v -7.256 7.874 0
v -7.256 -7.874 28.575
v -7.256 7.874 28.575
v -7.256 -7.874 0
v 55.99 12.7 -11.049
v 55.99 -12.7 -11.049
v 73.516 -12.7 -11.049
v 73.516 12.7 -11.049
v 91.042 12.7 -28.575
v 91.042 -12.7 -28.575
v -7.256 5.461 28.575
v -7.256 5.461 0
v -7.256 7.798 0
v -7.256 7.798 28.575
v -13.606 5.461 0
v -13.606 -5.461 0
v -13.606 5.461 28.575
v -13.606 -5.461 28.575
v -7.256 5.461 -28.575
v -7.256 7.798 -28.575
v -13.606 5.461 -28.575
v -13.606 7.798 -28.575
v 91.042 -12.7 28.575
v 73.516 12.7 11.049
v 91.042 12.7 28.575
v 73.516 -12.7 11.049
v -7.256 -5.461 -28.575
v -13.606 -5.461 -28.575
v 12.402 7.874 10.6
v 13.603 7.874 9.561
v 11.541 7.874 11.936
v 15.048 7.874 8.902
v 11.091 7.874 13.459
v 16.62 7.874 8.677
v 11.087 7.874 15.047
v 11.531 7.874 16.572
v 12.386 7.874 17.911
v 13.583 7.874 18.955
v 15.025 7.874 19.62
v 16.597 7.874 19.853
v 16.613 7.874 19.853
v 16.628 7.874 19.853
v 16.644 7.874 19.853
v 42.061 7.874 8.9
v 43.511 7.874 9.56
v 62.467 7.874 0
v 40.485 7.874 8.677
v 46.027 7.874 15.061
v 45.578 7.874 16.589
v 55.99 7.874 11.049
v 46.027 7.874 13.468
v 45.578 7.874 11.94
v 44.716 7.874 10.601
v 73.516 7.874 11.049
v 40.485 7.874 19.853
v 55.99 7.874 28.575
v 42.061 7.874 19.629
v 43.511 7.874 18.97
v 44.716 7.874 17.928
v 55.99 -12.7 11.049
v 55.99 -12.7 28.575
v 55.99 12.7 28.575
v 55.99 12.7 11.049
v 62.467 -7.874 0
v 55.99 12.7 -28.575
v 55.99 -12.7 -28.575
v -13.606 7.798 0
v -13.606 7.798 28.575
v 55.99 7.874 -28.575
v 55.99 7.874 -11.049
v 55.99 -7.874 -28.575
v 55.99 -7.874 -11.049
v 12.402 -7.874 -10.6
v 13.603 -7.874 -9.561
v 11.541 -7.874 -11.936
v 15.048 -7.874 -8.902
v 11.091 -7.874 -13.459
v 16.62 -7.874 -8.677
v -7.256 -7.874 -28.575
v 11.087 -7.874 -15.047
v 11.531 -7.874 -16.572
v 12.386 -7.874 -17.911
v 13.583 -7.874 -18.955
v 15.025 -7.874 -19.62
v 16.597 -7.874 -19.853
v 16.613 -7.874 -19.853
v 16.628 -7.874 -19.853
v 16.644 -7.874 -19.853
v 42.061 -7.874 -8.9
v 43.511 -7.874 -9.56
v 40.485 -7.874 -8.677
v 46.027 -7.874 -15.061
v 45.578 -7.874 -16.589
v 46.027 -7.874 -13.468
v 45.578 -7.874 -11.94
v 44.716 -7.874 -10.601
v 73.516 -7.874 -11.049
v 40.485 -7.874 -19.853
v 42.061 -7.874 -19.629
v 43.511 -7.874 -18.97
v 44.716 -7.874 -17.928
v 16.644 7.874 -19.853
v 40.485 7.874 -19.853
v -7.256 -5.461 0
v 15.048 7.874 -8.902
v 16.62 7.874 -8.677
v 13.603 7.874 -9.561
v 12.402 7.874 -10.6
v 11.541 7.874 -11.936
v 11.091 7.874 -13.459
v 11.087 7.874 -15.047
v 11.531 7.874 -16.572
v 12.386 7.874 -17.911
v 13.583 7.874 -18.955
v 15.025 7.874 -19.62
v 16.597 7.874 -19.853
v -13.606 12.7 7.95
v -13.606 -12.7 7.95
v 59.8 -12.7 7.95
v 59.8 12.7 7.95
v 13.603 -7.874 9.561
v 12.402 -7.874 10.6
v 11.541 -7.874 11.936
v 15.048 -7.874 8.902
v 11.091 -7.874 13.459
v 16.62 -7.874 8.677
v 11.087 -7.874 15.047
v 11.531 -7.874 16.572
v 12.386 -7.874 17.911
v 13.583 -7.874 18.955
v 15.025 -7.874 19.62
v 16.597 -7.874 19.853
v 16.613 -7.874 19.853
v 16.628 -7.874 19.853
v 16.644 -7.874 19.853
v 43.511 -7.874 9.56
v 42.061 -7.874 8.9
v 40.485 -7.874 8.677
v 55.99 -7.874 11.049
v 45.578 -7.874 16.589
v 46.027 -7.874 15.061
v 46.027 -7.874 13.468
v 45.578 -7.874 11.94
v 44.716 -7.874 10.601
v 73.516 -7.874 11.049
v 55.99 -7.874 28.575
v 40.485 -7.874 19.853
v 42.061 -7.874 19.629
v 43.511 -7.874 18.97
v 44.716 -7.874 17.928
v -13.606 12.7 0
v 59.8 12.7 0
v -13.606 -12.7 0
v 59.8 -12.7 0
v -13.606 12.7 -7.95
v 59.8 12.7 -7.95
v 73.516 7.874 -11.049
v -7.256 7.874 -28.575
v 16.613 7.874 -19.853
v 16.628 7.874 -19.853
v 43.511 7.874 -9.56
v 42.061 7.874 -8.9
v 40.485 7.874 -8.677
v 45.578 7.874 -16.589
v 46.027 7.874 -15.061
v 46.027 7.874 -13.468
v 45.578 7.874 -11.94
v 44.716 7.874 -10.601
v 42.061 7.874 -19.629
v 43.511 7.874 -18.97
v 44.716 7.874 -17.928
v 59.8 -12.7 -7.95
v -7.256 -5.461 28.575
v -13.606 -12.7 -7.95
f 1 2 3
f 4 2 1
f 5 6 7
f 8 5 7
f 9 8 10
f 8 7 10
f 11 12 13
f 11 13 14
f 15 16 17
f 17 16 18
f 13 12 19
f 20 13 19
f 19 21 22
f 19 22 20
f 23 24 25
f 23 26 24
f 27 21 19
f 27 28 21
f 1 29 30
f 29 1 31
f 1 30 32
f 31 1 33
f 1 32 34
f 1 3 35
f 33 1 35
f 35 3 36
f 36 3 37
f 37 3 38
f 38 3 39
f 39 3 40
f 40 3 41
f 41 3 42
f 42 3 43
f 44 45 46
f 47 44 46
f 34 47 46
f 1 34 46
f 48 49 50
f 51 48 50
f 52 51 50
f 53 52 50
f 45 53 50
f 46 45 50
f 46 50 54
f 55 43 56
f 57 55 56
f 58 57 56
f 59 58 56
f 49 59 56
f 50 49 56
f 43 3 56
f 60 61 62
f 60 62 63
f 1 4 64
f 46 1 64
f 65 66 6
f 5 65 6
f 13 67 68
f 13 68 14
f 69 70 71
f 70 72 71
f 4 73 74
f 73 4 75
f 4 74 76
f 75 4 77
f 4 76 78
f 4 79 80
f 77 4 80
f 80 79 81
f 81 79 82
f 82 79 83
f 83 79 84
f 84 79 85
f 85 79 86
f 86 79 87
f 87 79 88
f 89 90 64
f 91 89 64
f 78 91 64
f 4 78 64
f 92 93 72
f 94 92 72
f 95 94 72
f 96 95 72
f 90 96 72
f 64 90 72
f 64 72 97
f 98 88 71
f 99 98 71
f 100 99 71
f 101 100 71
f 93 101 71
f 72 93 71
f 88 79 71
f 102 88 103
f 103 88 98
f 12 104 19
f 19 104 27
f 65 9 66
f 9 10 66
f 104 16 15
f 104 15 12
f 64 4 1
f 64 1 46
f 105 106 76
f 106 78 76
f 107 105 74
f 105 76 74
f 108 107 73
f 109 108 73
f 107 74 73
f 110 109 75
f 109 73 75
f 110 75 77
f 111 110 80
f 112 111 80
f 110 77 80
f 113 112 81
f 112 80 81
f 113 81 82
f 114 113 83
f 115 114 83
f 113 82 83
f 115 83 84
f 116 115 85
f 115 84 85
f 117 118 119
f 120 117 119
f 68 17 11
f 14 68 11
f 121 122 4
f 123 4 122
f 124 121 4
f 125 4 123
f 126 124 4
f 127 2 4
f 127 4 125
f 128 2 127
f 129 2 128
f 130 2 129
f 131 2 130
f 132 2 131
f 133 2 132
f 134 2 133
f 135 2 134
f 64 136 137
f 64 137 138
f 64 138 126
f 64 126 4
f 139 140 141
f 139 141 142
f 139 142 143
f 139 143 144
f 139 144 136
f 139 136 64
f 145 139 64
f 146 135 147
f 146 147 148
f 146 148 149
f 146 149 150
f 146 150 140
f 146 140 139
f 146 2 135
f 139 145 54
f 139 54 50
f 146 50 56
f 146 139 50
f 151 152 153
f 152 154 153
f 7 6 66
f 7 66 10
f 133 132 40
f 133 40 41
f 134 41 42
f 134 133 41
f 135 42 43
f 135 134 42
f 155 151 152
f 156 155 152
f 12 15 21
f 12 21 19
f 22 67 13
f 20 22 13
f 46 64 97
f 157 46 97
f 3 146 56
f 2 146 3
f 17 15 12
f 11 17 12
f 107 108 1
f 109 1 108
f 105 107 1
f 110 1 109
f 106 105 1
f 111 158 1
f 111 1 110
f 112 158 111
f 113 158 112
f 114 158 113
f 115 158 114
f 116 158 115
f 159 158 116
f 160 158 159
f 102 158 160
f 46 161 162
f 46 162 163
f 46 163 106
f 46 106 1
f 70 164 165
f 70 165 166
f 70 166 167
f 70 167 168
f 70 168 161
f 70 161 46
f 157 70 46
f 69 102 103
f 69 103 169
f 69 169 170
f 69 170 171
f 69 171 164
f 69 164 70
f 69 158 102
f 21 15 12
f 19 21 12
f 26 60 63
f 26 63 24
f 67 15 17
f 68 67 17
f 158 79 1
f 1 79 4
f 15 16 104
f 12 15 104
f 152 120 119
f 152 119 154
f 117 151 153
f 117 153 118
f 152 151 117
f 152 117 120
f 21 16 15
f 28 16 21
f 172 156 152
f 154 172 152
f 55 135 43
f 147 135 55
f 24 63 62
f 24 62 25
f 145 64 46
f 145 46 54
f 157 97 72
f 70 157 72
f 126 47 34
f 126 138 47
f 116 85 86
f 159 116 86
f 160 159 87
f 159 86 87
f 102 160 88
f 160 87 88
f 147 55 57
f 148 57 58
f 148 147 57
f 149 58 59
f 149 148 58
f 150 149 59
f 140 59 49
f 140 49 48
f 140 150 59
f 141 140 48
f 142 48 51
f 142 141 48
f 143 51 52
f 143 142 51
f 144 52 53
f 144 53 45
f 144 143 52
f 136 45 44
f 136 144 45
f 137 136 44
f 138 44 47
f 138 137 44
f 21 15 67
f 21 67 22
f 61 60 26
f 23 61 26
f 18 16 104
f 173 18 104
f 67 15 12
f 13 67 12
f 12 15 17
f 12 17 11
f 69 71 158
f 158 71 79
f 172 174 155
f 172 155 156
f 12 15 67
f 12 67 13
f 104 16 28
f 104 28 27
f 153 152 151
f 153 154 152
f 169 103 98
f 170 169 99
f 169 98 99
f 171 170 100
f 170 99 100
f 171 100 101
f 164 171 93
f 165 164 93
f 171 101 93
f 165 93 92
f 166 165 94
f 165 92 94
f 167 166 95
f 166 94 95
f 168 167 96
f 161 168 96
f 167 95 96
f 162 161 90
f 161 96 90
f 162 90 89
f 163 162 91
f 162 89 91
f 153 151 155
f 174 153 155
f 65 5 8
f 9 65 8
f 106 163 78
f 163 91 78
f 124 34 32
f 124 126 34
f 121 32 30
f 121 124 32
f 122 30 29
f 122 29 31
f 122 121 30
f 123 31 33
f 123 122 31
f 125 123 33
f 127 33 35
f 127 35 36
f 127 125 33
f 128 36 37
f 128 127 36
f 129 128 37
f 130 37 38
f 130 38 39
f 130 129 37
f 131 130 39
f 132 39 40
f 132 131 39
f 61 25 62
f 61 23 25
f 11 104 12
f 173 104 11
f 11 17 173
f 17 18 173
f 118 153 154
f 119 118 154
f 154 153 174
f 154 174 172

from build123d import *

# Parameters (mm, degrees)
F1_DEPTH = 12.7
F2_DEPTH = 7.874
F0_W     = 6.35
F0_H     = 28.575
F3_DEPTH = 5.461
F4_DEPTH = 2.3368


with BuildPart() as f1:
    # F0 (on Front) → F1 (new body, symmetric)
    with BuildSketch(Plane.XZ):
        Polygon((-7.2555875471, 0), (-13.6055875471, 0), (-13.6055875471, -7.9502), (59.8004124529, -7.9502), (59.8004124529, 0), align=None)
    extrude(amount=F1_DEPTH, both=True)


with BuildPart() as f1b:
    # F0 (on Front) → F1, piece 2 (new body, symmetric)
    with BuildSketch(Plane.XZ):
        Polygon((91.0424124529, 28.575), (55.9904124529, 28.575), (55.9904124529, 11.049), (73.5164124529, 11.049), align=None)
    extrude(amount=F1_DEPTH, both=True)


with BuildPart() as f2:
    # F0 (on Front) → F2 (new body, symmetric)
    with BuildSketch(Plane.XZ):
        Polygon((-7.2555875471, 28.575), (-7.2555875471, 0), (59.8004124529, 0), (62.4674124529, 0), (73.5164124529, 11.049), (55.9904124529, 11.049), (55.9904124529, 28.575), align=None)
        with BuildLine():
            ThreePointArc((16.5966869565, 19.852683718), (16.6204376899, 19.852734192), (16.6441884234, 19.852683718))
            Line((16.6441884234, 19.852683718), (40.4845493284, 19.852683718))
            ThreePointArc((40.4845493284, 19.852683718), (46.0844124529, 14.264683718), (40.4845493284, 8.676683718))
            Line((40.4845493284, 8.676683718), (16.6204376899, 8.676683718))
            ThreePointArc((16.6204376899, 8.676683718), (11.0324250715, 14.2528335615), (16.5966869565, 19.852683718))
        make_face(mode=Mode.SUBTRACT)
    extrude(amount=F2_DEPTH, both=True)


with BuildPart() as f3:
    # F0 (on Front) → F3 (new body, symmetric)
    with BuildSketch(Plane.XZ):
        with Locations((-10.4305875471, 14.2875)):
            Rectangle(F0_W, F0_H)
    extrude(amount=F3_DEPTH, both=True)


with BuildPart() as f4:
    # F4 (new): a face of the model
    f4_faces = [f3.part.faces().sort_by_distance(p)[0] for p in [
        (-10.4305875471, 5.461, 14.2875),
    ]]
    extrude(f4_faces, amount=F4_DEPTH)


with BuildPart() as f5_1:
    # F5: instance of F1b
    add(f1b.part.mirror(Plane.XY))


with BuildPart() as f5_2:
    # F5: instance of F1
    add(f1.part.mirror(Plane.XY))


with BuildPart() as f5_3:
    # F5: instance of F2
    add(f2.part.mirror(Plane.XY))


with BuildPart() as f5_4:
    # F5: instance of F3
    add(f3.part.mirror(Plane.XY))


with BuildPart() as f5_5:
    # F5: instance of F4
    add(f4.part.mirror(Plane.XY))


solid = Compound([f1.part, f1b.part, f2.part, f3.part, f4.part, f5_1.part, f5_2.part, f5_3.part, f5_4.part, f5_5.part])
